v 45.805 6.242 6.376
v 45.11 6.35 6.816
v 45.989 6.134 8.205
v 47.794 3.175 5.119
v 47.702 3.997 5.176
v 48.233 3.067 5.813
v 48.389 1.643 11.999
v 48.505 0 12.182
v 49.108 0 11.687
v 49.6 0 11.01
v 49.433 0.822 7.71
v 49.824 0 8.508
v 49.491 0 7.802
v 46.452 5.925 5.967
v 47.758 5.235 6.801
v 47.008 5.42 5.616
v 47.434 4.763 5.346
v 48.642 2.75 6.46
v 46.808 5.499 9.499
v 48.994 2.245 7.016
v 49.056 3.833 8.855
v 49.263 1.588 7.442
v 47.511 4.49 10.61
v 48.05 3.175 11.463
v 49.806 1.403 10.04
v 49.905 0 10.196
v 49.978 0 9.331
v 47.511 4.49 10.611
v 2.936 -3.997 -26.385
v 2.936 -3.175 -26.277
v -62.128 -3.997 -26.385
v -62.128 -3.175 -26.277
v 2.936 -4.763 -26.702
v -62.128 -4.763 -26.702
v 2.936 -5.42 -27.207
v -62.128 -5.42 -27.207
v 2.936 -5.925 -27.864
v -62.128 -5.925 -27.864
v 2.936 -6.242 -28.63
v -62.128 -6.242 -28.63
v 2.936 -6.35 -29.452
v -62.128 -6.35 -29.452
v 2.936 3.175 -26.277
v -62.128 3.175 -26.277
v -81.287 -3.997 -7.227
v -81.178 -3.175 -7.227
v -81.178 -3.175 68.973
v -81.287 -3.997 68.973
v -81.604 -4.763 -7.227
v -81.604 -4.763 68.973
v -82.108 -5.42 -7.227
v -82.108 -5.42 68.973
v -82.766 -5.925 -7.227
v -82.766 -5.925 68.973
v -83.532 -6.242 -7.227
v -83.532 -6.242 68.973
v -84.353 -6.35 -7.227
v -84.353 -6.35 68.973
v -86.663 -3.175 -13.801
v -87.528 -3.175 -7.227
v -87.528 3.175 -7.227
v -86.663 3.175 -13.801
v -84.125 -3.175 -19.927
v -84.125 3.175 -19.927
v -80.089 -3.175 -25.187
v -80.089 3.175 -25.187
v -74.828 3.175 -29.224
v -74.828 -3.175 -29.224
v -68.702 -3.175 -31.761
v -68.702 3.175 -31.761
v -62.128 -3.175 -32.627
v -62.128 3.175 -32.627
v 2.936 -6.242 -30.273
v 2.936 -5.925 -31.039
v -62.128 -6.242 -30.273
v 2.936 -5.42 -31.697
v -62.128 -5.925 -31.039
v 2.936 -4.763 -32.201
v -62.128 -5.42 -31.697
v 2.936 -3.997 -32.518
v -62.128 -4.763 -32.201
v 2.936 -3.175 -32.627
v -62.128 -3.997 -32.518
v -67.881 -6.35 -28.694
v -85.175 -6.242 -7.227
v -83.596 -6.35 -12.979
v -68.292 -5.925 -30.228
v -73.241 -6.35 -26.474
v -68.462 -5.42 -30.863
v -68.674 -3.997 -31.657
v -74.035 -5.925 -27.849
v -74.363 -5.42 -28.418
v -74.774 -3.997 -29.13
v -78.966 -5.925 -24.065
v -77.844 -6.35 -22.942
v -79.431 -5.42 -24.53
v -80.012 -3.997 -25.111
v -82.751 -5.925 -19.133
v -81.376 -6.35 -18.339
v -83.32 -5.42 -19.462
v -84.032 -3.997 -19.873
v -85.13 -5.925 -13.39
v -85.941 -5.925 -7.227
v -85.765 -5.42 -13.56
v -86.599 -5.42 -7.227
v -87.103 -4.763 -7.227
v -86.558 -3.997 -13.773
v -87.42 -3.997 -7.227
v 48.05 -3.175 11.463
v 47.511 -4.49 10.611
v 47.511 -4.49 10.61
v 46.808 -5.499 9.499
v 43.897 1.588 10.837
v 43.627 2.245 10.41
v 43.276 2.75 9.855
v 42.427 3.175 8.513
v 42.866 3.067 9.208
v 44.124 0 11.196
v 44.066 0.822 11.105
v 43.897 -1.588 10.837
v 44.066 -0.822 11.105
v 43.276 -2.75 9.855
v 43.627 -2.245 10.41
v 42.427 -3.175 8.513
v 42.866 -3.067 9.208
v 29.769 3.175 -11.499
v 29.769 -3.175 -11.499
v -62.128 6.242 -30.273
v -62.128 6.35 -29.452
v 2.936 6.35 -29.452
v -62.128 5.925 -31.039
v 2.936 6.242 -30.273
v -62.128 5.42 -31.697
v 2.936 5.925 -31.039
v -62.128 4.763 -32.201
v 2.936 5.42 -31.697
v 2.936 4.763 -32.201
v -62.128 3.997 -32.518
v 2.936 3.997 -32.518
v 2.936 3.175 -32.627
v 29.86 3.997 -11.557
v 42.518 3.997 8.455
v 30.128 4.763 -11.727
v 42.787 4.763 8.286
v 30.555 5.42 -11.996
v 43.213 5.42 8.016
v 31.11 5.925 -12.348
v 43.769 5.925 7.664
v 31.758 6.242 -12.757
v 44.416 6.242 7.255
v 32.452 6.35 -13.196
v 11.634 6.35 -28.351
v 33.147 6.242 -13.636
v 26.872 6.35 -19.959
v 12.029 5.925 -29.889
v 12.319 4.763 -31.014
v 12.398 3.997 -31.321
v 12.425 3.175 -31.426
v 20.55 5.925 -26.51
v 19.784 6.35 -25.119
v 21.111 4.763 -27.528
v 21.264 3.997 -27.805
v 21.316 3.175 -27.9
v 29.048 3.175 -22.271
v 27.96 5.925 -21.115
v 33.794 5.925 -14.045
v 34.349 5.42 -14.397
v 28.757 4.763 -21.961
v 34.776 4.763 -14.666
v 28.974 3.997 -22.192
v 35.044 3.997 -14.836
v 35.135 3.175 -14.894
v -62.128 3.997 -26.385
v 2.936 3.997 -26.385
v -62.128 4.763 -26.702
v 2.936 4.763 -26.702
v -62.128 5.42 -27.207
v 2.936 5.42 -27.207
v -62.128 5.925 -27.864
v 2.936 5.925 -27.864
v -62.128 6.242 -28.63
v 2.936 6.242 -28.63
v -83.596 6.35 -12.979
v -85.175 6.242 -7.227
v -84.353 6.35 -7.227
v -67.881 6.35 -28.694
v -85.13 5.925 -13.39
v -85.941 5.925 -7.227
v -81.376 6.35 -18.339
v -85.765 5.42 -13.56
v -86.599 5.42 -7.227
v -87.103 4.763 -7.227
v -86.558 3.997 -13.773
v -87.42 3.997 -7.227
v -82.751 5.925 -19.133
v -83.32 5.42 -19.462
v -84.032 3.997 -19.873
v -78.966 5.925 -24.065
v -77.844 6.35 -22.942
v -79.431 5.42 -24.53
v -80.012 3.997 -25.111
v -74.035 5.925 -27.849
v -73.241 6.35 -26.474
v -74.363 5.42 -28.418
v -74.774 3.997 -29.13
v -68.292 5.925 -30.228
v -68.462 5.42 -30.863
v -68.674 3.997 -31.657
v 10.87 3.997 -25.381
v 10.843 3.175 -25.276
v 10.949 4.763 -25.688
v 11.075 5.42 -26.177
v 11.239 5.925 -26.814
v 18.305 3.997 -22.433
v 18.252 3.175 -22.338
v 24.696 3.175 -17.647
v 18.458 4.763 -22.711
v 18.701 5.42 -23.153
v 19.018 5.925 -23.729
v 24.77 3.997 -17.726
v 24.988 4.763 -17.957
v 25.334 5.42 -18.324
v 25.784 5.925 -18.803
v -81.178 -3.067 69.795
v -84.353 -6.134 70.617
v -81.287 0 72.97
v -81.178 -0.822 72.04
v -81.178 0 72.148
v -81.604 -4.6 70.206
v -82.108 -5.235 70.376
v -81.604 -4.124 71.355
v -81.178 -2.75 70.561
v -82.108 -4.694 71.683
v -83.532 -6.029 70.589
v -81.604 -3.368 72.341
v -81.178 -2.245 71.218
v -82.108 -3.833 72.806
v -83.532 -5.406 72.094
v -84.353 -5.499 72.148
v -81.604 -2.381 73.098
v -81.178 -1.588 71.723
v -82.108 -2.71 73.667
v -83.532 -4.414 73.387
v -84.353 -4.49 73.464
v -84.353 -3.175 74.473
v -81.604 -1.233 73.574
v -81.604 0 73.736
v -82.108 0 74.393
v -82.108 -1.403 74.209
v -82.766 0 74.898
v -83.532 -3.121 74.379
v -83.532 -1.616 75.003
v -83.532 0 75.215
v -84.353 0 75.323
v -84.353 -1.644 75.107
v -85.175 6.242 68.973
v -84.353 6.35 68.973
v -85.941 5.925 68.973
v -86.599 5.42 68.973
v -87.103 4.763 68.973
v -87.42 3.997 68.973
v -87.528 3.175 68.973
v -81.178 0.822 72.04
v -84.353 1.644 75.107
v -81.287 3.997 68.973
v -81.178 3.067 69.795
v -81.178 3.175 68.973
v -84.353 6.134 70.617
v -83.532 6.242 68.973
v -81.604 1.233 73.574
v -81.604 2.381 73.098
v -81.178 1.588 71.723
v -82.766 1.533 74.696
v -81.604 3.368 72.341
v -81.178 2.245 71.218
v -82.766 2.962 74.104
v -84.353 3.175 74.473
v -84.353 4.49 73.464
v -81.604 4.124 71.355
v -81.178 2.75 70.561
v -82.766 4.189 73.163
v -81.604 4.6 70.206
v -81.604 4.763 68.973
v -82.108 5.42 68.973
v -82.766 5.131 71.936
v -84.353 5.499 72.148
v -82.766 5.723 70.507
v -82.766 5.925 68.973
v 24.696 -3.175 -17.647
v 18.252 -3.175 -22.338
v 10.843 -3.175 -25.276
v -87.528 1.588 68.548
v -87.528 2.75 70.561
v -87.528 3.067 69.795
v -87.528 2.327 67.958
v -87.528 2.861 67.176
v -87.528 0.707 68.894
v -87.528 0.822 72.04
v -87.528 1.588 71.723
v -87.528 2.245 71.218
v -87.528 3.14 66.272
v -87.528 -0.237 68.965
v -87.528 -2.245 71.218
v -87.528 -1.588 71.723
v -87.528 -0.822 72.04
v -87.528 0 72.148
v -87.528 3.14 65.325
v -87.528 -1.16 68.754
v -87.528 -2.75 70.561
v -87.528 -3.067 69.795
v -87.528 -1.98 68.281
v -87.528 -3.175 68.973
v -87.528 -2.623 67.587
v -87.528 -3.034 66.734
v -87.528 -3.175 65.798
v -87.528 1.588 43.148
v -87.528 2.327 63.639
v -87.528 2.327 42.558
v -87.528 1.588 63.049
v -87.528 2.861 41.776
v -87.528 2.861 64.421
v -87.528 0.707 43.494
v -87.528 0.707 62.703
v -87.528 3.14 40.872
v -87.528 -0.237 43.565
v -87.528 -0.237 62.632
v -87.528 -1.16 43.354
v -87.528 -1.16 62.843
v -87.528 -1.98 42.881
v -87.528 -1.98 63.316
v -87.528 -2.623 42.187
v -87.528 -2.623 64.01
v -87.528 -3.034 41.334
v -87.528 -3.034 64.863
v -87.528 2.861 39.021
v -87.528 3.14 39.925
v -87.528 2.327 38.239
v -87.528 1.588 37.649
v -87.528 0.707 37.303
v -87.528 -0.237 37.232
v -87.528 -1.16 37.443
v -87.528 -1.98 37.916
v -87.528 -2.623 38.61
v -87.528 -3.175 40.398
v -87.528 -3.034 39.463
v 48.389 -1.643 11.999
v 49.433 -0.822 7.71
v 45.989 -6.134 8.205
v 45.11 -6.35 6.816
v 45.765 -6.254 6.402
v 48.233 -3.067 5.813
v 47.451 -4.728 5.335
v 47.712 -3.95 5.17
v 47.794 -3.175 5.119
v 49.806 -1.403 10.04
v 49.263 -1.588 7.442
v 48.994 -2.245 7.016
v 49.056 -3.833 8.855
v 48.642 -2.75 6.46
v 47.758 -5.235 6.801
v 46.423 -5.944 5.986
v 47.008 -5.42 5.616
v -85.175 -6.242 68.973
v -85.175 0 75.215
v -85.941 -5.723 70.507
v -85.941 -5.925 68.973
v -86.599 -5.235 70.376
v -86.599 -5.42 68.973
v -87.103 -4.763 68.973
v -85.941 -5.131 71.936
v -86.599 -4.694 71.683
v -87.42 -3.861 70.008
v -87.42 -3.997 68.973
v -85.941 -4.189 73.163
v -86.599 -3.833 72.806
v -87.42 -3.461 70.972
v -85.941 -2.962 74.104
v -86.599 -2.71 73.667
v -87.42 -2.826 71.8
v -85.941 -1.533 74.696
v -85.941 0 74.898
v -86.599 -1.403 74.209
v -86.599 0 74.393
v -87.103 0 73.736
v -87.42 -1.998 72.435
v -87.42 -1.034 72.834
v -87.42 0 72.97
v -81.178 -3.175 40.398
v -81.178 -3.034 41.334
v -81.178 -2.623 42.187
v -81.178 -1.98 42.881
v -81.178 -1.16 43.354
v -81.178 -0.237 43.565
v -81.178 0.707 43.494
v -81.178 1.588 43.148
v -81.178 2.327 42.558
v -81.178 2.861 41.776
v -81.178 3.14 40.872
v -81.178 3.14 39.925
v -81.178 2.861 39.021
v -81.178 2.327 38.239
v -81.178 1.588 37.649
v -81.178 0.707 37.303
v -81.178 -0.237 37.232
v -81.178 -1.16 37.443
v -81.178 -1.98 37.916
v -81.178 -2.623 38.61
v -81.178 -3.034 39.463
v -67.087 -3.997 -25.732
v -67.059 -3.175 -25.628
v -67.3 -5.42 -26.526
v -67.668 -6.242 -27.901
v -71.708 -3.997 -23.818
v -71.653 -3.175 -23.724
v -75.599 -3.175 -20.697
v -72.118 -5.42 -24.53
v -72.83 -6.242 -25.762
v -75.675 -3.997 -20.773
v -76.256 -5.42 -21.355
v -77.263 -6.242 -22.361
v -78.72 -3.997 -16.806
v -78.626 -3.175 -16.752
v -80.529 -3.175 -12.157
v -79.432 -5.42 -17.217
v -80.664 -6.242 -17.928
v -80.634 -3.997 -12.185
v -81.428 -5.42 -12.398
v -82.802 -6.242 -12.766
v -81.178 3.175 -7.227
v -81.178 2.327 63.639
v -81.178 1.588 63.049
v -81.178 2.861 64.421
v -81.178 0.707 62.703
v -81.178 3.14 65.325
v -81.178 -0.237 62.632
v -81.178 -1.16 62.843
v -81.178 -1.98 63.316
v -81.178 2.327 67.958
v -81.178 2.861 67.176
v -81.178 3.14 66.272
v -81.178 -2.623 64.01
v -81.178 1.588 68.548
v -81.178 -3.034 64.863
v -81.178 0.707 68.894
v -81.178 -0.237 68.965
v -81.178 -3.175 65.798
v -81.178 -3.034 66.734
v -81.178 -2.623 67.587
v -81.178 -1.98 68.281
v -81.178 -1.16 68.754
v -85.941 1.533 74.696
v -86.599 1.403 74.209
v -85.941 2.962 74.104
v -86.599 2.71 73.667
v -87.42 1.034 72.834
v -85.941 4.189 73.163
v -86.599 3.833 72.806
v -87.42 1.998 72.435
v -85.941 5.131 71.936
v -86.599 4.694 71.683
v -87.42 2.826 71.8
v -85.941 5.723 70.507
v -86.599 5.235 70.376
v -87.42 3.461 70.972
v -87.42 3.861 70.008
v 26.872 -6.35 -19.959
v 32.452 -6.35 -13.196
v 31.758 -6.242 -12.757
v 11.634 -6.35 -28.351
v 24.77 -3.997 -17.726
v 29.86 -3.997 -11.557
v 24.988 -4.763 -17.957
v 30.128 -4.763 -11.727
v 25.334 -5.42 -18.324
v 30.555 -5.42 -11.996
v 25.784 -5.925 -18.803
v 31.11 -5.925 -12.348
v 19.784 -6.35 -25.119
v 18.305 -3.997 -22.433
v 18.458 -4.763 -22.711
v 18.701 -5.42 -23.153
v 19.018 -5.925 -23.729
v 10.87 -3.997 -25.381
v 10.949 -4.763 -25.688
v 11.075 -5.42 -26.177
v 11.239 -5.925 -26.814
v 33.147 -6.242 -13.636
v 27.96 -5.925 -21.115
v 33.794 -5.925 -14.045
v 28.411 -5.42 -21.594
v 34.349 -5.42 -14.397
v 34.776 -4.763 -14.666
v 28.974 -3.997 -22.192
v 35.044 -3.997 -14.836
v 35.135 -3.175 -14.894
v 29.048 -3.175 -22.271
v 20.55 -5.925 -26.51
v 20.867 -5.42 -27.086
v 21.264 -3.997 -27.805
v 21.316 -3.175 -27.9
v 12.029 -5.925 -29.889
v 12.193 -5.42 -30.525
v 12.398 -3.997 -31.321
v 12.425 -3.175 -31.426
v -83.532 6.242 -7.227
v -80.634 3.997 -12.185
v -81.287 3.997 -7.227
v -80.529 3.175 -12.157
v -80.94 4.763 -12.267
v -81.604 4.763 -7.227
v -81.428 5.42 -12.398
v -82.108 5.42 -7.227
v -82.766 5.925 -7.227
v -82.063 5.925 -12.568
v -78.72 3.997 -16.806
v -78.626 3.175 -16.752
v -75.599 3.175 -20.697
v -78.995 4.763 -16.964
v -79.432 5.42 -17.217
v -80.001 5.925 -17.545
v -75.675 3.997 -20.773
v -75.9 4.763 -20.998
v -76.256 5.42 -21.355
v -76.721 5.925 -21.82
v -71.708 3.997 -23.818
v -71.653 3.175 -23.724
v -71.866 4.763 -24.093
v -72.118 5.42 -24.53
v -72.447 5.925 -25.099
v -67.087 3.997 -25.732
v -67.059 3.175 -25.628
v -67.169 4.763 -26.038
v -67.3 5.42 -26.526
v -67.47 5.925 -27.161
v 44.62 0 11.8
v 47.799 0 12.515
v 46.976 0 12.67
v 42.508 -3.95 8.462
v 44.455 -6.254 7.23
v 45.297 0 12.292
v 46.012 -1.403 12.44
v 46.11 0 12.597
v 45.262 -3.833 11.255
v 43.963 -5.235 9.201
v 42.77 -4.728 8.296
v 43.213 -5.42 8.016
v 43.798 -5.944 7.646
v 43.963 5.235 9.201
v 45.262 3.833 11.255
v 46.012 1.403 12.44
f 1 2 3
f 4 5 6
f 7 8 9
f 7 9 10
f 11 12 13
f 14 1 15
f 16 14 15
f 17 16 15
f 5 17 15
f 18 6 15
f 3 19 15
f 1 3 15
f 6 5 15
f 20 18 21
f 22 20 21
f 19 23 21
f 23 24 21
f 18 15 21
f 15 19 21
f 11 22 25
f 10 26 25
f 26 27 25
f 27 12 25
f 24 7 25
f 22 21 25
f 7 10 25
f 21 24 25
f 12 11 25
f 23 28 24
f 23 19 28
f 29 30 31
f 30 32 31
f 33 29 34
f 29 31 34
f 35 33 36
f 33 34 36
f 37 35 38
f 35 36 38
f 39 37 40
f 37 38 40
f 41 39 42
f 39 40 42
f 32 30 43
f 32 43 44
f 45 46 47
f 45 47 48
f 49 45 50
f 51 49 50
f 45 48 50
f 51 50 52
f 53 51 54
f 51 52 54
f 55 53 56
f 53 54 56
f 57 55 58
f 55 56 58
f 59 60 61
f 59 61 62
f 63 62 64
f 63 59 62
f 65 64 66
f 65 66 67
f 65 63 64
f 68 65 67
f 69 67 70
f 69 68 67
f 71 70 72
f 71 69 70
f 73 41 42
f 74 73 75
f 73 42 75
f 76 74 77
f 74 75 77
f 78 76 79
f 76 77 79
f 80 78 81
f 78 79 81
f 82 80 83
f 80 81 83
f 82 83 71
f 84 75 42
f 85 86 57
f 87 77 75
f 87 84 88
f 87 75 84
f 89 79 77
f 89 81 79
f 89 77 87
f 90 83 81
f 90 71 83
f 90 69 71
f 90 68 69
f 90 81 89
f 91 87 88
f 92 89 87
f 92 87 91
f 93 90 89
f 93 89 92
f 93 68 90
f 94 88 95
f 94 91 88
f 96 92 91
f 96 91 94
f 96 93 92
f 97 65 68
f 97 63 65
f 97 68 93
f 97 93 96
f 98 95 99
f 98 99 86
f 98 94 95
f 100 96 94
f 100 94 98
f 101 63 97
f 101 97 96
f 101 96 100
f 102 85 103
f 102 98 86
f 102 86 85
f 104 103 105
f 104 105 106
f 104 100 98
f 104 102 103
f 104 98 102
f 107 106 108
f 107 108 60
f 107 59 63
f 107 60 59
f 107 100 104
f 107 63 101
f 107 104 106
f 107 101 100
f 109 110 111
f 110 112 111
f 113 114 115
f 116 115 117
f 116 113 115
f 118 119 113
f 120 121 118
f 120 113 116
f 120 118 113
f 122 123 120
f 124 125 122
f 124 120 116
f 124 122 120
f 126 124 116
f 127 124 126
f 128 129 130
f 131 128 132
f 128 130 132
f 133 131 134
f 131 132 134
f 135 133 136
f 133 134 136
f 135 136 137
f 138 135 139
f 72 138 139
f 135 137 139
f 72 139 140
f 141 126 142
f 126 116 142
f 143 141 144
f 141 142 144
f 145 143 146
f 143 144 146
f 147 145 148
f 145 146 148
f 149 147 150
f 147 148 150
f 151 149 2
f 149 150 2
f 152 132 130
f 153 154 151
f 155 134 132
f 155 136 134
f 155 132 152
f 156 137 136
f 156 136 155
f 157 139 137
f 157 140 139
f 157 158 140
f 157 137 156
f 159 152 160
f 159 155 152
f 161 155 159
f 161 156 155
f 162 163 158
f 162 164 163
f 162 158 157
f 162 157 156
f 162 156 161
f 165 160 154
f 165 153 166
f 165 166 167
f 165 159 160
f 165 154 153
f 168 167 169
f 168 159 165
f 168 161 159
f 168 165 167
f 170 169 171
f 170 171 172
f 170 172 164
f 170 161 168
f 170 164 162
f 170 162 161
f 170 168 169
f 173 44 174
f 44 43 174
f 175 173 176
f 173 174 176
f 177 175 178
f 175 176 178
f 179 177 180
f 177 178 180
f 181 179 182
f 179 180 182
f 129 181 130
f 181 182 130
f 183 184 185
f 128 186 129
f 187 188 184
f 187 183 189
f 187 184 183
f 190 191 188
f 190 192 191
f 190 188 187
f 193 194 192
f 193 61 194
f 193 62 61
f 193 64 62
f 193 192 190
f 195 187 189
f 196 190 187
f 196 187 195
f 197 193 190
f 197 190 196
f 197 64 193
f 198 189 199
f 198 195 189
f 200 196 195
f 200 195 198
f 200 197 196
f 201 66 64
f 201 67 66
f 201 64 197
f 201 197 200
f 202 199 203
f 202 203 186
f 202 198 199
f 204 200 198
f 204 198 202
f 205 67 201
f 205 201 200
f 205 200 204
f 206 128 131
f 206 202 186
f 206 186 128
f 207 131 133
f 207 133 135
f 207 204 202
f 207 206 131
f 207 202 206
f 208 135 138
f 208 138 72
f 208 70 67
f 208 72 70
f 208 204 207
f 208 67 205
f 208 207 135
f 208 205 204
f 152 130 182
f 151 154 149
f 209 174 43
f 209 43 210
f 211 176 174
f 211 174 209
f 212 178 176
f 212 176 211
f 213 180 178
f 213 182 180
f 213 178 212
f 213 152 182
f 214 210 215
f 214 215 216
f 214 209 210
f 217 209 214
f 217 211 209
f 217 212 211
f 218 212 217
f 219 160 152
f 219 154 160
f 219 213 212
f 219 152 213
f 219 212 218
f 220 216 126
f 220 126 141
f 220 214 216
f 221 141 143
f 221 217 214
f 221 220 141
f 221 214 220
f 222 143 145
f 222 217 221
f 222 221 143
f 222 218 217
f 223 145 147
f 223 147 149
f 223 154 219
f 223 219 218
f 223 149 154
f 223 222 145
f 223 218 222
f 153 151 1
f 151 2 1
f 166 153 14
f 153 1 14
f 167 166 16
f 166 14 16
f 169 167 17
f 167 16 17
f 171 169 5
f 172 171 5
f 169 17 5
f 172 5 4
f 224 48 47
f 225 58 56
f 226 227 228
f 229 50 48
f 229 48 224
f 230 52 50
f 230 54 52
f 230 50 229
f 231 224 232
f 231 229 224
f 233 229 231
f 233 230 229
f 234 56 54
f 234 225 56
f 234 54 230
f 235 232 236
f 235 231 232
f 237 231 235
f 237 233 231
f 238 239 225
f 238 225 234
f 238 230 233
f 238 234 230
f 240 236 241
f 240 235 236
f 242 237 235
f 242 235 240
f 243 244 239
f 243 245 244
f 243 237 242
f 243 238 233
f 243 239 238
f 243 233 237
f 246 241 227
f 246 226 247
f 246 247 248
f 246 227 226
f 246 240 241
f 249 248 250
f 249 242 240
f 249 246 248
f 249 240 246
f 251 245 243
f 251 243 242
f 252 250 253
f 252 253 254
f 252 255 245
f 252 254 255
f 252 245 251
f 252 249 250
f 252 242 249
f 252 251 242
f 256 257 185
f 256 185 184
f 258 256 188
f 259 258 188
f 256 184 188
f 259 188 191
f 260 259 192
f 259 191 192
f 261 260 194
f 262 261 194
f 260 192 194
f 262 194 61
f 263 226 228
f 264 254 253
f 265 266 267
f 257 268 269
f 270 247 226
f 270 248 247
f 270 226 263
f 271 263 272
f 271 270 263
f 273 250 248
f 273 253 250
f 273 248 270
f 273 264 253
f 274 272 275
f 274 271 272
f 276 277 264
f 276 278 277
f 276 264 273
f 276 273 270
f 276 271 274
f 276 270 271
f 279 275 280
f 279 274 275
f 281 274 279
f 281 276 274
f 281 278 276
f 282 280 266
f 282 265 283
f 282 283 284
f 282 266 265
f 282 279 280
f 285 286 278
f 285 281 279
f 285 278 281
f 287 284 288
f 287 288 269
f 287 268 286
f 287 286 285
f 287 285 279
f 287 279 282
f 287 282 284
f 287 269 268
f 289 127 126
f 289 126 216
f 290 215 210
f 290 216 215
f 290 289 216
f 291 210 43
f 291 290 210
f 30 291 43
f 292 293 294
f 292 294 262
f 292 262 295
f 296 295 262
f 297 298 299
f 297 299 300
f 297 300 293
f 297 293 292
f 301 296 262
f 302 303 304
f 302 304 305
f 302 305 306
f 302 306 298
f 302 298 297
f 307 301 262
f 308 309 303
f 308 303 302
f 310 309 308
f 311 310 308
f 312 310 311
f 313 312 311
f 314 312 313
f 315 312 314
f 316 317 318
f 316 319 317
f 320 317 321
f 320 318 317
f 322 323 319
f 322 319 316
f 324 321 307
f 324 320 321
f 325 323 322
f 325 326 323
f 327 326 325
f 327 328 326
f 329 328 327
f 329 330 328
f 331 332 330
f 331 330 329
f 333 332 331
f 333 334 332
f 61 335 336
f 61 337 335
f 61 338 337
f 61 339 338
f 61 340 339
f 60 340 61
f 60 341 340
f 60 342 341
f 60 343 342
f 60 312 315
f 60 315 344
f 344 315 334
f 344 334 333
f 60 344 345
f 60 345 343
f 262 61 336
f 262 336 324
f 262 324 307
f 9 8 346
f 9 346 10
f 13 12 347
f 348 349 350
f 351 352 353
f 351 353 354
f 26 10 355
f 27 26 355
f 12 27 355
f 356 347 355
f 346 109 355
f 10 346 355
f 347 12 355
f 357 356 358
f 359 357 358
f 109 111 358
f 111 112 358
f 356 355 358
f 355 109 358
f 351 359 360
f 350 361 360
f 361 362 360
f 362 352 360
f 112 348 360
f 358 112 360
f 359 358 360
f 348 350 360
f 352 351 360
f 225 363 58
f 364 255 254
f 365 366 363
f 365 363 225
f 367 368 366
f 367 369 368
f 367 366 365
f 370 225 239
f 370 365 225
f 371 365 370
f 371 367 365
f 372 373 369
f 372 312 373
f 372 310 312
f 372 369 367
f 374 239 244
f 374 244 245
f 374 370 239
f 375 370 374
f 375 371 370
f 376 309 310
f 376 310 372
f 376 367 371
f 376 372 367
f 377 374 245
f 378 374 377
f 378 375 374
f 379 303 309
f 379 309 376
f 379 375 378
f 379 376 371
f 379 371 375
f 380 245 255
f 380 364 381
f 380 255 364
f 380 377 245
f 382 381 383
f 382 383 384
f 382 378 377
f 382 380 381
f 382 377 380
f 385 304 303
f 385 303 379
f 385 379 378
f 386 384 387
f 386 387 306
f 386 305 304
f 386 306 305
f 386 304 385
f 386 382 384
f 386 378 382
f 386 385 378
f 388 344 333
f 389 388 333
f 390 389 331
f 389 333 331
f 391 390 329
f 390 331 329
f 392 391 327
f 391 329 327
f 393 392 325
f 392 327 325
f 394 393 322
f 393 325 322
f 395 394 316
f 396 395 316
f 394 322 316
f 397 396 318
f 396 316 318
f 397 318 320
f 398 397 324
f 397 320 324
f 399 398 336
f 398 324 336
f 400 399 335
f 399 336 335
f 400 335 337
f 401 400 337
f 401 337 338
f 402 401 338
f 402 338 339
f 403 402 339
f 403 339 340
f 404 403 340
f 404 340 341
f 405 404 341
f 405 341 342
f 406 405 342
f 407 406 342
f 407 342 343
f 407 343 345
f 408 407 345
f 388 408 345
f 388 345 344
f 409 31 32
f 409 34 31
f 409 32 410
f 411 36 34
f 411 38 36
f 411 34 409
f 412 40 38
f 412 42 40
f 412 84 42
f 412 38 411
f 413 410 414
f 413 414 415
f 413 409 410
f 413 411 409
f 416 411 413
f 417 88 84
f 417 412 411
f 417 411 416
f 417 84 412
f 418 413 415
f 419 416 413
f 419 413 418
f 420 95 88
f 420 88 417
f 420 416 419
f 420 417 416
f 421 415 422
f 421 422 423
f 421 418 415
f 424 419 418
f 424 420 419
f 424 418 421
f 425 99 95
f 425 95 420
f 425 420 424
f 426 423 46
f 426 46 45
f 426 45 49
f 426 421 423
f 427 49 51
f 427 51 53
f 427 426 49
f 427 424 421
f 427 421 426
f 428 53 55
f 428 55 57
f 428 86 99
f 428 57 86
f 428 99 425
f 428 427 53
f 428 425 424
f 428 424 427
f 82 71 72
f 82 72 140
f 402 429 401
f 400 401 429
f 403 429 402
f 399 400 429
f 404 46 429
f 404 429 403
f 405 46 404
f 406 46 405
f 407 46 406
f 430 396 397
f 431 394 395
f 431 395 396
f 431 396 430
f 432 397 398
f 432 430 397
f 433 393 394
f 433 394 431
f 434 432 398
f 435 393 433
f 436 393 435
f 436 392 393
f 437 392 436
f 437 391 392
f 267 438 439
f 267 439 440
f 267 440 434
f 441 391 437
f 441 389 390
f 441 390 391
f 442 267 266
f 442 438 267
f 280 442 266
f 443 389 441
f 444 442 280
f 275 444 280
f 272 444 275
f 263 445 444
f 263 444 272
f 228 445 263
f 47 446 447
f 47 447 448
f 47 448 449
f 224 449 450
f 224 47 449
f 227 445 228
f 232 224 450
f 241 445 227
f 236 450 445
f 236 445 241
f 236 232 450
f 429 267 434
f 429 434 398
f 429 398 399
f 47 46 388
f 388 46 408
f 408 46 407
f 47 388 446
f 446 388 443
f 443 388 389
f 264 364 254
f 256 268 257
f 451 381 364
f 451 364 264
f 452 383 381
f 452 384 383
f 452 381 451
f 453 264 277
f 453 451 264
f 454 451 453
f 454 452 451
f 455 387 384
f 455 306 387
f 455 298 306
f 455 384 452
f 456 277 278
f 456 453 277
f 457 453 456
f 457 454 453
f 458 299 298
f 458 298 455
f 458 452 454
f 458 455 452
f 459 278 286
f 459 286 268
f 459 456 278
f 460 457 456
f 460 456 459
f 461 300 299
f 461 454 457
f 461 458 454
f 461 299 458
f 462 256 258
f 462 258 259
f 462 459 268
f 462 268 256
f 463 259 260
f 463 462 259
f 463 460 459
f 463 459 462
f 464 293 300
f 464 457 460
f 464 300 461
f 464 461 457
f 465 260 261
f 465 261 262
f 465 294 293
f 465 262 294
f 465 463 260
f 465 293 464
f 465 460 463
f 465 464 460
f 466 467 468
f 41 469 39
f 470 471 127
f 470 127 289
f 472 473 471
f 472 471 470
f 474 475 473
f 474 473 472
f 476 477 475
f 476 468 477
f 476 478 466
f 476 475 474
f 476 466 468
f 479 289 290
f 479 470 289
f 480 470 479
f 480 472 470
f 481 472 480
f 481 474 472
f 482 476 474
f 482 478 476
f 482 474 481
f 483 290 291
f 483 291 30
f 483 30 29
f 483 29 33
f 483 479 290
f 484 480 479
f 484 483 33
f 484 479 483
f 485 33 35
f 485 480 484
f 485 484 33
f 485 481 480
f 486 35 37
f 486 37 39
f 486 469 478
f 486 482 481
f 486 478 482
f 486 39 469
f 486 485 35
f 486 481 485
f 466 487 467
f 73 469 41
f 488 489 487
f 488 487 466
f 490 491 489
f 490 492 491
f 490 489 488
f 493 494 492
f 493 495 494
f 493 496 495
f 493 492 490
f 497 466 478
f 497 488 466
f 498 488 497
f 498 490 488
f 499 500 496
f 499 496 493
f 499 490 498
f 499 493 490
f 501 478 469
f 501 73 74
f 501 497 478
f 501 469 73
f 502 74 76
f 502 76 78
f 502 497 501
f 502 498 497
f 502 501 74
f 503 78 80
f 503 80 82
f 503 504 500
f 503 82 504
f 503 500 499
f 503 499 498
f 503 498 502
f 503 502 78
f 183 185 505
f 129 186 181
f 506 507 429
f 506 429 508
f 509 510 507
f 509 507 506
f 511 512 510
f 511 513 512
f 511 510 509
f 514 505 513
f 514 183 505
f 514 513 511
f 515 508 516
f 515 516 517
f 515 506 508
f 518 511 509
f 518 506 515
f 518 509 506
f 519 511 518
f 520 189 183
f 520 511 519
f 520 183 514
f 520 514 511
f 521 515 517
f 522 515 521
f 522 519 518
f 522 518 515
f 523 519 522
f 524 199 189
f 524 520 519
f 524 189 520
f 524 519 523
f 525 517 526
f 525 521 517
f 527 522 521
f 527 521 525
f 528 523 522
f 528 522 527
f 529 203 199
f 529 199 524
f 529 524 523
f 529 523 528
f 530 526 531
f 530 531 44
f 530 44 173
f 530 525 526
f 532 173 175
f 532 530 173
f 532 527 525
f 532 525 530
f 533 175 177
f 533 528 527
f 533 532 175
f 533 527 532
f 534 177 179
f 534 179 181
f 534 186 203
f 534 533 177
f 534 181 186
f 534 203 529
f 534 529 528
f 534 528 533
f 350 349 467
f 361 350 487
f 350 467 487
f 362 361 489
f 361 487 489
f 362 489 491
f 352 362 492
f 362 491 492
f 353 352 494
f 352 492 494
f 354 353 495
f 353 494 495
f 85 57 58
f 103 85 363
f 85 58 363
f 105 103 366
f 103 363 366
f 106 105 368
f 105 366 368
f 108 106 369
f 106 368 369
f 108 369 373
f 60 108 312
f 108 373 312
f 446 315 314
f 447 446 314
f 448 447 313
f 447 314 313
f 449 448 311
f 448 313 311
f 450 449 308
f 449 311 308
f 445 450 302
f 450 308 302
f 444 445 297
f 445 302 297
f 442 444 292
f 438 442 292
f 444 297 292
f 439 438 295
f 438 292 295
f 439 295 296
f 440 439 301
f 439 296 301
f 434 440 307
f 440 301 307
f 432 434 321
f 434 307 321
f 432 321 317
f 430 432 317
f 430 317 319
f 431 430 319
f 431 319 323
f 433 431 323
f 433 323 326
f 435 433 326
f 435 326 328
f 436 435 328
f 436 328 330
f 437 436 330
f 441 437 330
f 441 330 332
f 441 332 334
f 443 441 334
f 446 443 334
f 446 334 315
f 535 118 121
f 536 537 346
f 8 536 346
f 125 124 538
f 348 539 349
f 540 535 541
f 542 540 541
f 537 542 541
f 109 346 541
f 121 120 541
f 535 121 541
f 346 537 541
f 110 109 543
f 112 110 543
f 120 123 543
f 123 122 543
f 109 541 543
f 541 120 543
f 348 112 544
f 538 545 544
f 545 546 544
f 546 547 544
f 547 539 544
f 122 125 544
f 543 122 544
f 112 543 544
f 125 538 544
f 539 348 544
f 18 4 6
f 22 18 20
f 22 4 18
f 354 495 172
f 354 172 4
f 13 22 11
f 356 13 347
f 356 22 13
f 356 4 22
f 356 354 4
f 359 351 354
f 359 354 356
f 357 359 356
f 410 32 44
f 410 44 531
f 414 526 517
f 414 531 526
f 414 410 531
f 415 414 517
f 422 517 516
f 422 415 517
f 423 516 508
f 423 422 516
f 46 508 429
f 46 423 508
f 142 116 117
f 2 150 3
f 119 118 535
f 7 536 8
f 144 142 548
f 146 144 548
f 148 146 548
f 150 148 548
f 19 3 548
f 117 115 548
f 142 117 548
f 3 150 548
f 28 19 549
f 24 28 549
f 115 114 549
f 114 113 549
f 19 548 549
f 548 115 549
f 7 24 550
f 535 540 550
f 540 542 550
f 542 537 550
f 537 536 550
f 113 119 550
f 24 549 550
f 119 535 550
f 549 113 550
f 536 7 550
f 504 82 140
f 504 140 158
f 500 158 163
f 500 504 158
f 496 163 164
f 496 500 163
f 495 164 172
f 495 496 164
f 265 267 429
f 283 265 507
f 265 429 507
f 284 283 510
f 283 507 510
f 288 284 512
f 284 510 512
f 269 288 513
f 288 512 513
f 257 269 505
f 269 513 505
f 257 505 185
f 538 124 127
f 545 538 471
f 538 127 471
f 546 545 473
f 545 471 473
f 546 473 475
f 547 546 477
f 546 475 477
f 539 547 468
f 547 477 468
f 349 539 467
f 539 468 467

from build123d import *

# Parameters (mm, degrees)
F1_DEPTH    = 6.35
F2_T1_DEPTH = 38.1
F3_T1_DEPTH = 38.1
F5_R        = 3.17499
F6_R        = 3.175
F7_DEPTH    = 25.4


# Not quite as in the source:
# - a fillet or chamfer that OpenCascade refuses, or shapes differently, is made with other operations: its cross-section is extruded or revolved along the edge and cut away or added
# - a fillet or chamfer is up to 0.001 mm smaller than in the source, because OpenCascade refuses the exact size
# - a feature of the source that left no trace in its solid (it failed there, or was rolled back) is left out


with BuildPart() as f1:
    # F0 (on Front) → F1 (new body, symmetric)
    with BuildSketch(Plane.XZ):
        with BuildLine():
            Line((-81.1784485418, -7.2266137339), (-81.1784485418, 75.3233862661))
            Line((-81.1784485418, 75.3233862661), (-87.5284485418, 75.3233862661))
            Line((-87.5284485418, 75.3233862661), (-87.5284485418, -7.2266137339))
            ThreePointArc((-87.5284485418, -7.2266137339), (-80.0889607839, -25.1871259761), (-62.1284485418, -32.6266137339))
            Line((-62.1284485418, -32.6266137339), (2.9360103709, -32.6266137339))
            ThreePointArc((2.9360103709, -32.6266137339), (21.3157063883, -27.9002077014), (35.1353023462, -14.8936360074))
            Line((35.1353023462, -14.8936360074), (51.1881001208, 10.4850725552))
            Line((51.1881001208, 10.4850725552), (45.8215514582, 13.8795762674))
            Line((45.8215514582, 13.8795762674), (29.7687536837, -11.4991322951))
            ThreePointArc((29.7687536837, -11.4991322951), (18.2524237187, -22.3379420402), (2.9360103709, -26.2766137339))
            Line((2.9360103709, -26.2766137339), (-62.1284485418, -26.2766137339))
            ThreePointArc((-62.1284485418, -26.2766137339), (-75.5988327234, -20.6969979155), (-81.1784485418, -7.2266137339))
        make_face()
    extrude(amount=F1_DEPTH, both=True)

    # F2: fillet of radius 6.35 on 2 edges, made by hand

    # F2_s2 → F2_t1 (cut)
    with BuildSketch(Plane.YZ.offset(-103.4034485418)):
        with BuildLine():
            ThreePointArc((0, 75.3233862661), (4.4901280605, 73.4635143266), (6.35, 68.9733862661))
            Line((6.35, 68.9733862661), (6.35, 75.3233862661))
            Line((6.35, 75.3233862661), (0, 75.3233862661))
        make_face()
        with BuildLine():
            ThreePointArc((0, 75.3233862661), (-4.4901280605, 73.4635143266), (-6.35, 68.9733862661))
            Line((-6.35, 68.9733862661), (-6.35, 75.3233862661))
            Line((-6.35, 75.3233862661), (0, 75.3233862661))
        make_face()
    extrude(amount=F2_T1_DEPTH, mode=Mode.SUBTRACT)

    # F3: fillet of radius 6.35 on 2 edges, made by hand

    # F3_s2 → F3_t1 (cut)
    with BuildSketch(Plane(origin=(45.2399237114, 0, -28.6156147341), x_dir=(0, 1, 0), z_dir=(-0.8451257736, 0, 0.5345675137))):
        with BuildLine():
            ThreePointArc((-6.35, -29.8747004693), (-4.4901280605, -34.3648285299), (0, -36.2247004693))
            Line((0, -36.2247004693), (-6.35, -36.2247004693))
            Line((-6.35, -36.2247004693), (-6.35, -29.8747004693))
        make_face()
        with BuildLine():
            ThreePointArc((6.35, -29.8747004693), (4.4901280605, -34.3648285299), (0, -36.2247004693))
            Line((0, -36.2247004693), (6.35, -36.2247004693))
            Line((6.35, -36.2247004693), (6.35, -29.8747004693))
        make_face()
    extrude(amount=F3_T1_DEPTH, mode=Mode.SUBTRACT)

    # F5 (radius 3.175 in the source; OpenCascade refuses exactly that, so slightly less here)
    f5_edges = [f1.edges().sort_by_distance(p)[0] for p in [
        (-81.178449, -6.35, 30.873386),
        (18.252424, 6.35, -22.337942),
        (18.252424, -6.35, -22.337942),
        (41.464449, 6.35, -4.887556),
        (21.315706, 6.35, -27.900208),
        (-29.596219, 6.35, -32.626614),
        (-80.088961, 6.35, -25.187126),
        (-87.528449, 6.35, 30.873386),
        (-81.178449, 6.35, 30.873386),
        (-75.598833, 6.35, -20.696998),
        (-29.596219, 6.35, -26.276614),
        (36.097901, 6.35, -1.493052),
        (-29.596219, -6.35, -26.276614),
        (41.464449, -6.35, -4.887556),
        (21.315706, -6.35, -27.900208),
        (-29.596219, -6.35, -32.626614),
        (-80.088961, -6.35, -25.187126),
        (-87.528449, -6.35, 30.873386),
        (-75.598833, -6.35, -20.696998),
        (36.097901, -6.35, -1.493052),
        (44.827324, 4.490128, 12.307751),
        (44.827324, -4.490128, 12.307751),
        (50.193873, 4.490128, 8.913247),
        (50.193873, -4.490128, 8.913247),
        (-87.528449, -4.490128, 73.463514),
        (-87.528449, 4.490128, 73.463514),
        (-81.178449, 4.490128, 73.463514),
        (-81.178449, -4.490128, 73.463514),
    ]]
    fillet(f5_edges, radius=F5_R)

    # F6 (on face) → F7 (cut)
    with BuildSketch(Plane(origin=(-87.5284485418, 0, 0), x_dir=(0, -1, 0), z_dir=(-1, 0, 0))):
        with Locations((0, 65.7983862661)):
            Circle(F6_R)
        with Locations((0, 40.3983862661)):
            Circle(F6_R)
    extrude(amount=-F7_DEPTH, mode=Mode.SUBTRACT)


solid = f1.part
